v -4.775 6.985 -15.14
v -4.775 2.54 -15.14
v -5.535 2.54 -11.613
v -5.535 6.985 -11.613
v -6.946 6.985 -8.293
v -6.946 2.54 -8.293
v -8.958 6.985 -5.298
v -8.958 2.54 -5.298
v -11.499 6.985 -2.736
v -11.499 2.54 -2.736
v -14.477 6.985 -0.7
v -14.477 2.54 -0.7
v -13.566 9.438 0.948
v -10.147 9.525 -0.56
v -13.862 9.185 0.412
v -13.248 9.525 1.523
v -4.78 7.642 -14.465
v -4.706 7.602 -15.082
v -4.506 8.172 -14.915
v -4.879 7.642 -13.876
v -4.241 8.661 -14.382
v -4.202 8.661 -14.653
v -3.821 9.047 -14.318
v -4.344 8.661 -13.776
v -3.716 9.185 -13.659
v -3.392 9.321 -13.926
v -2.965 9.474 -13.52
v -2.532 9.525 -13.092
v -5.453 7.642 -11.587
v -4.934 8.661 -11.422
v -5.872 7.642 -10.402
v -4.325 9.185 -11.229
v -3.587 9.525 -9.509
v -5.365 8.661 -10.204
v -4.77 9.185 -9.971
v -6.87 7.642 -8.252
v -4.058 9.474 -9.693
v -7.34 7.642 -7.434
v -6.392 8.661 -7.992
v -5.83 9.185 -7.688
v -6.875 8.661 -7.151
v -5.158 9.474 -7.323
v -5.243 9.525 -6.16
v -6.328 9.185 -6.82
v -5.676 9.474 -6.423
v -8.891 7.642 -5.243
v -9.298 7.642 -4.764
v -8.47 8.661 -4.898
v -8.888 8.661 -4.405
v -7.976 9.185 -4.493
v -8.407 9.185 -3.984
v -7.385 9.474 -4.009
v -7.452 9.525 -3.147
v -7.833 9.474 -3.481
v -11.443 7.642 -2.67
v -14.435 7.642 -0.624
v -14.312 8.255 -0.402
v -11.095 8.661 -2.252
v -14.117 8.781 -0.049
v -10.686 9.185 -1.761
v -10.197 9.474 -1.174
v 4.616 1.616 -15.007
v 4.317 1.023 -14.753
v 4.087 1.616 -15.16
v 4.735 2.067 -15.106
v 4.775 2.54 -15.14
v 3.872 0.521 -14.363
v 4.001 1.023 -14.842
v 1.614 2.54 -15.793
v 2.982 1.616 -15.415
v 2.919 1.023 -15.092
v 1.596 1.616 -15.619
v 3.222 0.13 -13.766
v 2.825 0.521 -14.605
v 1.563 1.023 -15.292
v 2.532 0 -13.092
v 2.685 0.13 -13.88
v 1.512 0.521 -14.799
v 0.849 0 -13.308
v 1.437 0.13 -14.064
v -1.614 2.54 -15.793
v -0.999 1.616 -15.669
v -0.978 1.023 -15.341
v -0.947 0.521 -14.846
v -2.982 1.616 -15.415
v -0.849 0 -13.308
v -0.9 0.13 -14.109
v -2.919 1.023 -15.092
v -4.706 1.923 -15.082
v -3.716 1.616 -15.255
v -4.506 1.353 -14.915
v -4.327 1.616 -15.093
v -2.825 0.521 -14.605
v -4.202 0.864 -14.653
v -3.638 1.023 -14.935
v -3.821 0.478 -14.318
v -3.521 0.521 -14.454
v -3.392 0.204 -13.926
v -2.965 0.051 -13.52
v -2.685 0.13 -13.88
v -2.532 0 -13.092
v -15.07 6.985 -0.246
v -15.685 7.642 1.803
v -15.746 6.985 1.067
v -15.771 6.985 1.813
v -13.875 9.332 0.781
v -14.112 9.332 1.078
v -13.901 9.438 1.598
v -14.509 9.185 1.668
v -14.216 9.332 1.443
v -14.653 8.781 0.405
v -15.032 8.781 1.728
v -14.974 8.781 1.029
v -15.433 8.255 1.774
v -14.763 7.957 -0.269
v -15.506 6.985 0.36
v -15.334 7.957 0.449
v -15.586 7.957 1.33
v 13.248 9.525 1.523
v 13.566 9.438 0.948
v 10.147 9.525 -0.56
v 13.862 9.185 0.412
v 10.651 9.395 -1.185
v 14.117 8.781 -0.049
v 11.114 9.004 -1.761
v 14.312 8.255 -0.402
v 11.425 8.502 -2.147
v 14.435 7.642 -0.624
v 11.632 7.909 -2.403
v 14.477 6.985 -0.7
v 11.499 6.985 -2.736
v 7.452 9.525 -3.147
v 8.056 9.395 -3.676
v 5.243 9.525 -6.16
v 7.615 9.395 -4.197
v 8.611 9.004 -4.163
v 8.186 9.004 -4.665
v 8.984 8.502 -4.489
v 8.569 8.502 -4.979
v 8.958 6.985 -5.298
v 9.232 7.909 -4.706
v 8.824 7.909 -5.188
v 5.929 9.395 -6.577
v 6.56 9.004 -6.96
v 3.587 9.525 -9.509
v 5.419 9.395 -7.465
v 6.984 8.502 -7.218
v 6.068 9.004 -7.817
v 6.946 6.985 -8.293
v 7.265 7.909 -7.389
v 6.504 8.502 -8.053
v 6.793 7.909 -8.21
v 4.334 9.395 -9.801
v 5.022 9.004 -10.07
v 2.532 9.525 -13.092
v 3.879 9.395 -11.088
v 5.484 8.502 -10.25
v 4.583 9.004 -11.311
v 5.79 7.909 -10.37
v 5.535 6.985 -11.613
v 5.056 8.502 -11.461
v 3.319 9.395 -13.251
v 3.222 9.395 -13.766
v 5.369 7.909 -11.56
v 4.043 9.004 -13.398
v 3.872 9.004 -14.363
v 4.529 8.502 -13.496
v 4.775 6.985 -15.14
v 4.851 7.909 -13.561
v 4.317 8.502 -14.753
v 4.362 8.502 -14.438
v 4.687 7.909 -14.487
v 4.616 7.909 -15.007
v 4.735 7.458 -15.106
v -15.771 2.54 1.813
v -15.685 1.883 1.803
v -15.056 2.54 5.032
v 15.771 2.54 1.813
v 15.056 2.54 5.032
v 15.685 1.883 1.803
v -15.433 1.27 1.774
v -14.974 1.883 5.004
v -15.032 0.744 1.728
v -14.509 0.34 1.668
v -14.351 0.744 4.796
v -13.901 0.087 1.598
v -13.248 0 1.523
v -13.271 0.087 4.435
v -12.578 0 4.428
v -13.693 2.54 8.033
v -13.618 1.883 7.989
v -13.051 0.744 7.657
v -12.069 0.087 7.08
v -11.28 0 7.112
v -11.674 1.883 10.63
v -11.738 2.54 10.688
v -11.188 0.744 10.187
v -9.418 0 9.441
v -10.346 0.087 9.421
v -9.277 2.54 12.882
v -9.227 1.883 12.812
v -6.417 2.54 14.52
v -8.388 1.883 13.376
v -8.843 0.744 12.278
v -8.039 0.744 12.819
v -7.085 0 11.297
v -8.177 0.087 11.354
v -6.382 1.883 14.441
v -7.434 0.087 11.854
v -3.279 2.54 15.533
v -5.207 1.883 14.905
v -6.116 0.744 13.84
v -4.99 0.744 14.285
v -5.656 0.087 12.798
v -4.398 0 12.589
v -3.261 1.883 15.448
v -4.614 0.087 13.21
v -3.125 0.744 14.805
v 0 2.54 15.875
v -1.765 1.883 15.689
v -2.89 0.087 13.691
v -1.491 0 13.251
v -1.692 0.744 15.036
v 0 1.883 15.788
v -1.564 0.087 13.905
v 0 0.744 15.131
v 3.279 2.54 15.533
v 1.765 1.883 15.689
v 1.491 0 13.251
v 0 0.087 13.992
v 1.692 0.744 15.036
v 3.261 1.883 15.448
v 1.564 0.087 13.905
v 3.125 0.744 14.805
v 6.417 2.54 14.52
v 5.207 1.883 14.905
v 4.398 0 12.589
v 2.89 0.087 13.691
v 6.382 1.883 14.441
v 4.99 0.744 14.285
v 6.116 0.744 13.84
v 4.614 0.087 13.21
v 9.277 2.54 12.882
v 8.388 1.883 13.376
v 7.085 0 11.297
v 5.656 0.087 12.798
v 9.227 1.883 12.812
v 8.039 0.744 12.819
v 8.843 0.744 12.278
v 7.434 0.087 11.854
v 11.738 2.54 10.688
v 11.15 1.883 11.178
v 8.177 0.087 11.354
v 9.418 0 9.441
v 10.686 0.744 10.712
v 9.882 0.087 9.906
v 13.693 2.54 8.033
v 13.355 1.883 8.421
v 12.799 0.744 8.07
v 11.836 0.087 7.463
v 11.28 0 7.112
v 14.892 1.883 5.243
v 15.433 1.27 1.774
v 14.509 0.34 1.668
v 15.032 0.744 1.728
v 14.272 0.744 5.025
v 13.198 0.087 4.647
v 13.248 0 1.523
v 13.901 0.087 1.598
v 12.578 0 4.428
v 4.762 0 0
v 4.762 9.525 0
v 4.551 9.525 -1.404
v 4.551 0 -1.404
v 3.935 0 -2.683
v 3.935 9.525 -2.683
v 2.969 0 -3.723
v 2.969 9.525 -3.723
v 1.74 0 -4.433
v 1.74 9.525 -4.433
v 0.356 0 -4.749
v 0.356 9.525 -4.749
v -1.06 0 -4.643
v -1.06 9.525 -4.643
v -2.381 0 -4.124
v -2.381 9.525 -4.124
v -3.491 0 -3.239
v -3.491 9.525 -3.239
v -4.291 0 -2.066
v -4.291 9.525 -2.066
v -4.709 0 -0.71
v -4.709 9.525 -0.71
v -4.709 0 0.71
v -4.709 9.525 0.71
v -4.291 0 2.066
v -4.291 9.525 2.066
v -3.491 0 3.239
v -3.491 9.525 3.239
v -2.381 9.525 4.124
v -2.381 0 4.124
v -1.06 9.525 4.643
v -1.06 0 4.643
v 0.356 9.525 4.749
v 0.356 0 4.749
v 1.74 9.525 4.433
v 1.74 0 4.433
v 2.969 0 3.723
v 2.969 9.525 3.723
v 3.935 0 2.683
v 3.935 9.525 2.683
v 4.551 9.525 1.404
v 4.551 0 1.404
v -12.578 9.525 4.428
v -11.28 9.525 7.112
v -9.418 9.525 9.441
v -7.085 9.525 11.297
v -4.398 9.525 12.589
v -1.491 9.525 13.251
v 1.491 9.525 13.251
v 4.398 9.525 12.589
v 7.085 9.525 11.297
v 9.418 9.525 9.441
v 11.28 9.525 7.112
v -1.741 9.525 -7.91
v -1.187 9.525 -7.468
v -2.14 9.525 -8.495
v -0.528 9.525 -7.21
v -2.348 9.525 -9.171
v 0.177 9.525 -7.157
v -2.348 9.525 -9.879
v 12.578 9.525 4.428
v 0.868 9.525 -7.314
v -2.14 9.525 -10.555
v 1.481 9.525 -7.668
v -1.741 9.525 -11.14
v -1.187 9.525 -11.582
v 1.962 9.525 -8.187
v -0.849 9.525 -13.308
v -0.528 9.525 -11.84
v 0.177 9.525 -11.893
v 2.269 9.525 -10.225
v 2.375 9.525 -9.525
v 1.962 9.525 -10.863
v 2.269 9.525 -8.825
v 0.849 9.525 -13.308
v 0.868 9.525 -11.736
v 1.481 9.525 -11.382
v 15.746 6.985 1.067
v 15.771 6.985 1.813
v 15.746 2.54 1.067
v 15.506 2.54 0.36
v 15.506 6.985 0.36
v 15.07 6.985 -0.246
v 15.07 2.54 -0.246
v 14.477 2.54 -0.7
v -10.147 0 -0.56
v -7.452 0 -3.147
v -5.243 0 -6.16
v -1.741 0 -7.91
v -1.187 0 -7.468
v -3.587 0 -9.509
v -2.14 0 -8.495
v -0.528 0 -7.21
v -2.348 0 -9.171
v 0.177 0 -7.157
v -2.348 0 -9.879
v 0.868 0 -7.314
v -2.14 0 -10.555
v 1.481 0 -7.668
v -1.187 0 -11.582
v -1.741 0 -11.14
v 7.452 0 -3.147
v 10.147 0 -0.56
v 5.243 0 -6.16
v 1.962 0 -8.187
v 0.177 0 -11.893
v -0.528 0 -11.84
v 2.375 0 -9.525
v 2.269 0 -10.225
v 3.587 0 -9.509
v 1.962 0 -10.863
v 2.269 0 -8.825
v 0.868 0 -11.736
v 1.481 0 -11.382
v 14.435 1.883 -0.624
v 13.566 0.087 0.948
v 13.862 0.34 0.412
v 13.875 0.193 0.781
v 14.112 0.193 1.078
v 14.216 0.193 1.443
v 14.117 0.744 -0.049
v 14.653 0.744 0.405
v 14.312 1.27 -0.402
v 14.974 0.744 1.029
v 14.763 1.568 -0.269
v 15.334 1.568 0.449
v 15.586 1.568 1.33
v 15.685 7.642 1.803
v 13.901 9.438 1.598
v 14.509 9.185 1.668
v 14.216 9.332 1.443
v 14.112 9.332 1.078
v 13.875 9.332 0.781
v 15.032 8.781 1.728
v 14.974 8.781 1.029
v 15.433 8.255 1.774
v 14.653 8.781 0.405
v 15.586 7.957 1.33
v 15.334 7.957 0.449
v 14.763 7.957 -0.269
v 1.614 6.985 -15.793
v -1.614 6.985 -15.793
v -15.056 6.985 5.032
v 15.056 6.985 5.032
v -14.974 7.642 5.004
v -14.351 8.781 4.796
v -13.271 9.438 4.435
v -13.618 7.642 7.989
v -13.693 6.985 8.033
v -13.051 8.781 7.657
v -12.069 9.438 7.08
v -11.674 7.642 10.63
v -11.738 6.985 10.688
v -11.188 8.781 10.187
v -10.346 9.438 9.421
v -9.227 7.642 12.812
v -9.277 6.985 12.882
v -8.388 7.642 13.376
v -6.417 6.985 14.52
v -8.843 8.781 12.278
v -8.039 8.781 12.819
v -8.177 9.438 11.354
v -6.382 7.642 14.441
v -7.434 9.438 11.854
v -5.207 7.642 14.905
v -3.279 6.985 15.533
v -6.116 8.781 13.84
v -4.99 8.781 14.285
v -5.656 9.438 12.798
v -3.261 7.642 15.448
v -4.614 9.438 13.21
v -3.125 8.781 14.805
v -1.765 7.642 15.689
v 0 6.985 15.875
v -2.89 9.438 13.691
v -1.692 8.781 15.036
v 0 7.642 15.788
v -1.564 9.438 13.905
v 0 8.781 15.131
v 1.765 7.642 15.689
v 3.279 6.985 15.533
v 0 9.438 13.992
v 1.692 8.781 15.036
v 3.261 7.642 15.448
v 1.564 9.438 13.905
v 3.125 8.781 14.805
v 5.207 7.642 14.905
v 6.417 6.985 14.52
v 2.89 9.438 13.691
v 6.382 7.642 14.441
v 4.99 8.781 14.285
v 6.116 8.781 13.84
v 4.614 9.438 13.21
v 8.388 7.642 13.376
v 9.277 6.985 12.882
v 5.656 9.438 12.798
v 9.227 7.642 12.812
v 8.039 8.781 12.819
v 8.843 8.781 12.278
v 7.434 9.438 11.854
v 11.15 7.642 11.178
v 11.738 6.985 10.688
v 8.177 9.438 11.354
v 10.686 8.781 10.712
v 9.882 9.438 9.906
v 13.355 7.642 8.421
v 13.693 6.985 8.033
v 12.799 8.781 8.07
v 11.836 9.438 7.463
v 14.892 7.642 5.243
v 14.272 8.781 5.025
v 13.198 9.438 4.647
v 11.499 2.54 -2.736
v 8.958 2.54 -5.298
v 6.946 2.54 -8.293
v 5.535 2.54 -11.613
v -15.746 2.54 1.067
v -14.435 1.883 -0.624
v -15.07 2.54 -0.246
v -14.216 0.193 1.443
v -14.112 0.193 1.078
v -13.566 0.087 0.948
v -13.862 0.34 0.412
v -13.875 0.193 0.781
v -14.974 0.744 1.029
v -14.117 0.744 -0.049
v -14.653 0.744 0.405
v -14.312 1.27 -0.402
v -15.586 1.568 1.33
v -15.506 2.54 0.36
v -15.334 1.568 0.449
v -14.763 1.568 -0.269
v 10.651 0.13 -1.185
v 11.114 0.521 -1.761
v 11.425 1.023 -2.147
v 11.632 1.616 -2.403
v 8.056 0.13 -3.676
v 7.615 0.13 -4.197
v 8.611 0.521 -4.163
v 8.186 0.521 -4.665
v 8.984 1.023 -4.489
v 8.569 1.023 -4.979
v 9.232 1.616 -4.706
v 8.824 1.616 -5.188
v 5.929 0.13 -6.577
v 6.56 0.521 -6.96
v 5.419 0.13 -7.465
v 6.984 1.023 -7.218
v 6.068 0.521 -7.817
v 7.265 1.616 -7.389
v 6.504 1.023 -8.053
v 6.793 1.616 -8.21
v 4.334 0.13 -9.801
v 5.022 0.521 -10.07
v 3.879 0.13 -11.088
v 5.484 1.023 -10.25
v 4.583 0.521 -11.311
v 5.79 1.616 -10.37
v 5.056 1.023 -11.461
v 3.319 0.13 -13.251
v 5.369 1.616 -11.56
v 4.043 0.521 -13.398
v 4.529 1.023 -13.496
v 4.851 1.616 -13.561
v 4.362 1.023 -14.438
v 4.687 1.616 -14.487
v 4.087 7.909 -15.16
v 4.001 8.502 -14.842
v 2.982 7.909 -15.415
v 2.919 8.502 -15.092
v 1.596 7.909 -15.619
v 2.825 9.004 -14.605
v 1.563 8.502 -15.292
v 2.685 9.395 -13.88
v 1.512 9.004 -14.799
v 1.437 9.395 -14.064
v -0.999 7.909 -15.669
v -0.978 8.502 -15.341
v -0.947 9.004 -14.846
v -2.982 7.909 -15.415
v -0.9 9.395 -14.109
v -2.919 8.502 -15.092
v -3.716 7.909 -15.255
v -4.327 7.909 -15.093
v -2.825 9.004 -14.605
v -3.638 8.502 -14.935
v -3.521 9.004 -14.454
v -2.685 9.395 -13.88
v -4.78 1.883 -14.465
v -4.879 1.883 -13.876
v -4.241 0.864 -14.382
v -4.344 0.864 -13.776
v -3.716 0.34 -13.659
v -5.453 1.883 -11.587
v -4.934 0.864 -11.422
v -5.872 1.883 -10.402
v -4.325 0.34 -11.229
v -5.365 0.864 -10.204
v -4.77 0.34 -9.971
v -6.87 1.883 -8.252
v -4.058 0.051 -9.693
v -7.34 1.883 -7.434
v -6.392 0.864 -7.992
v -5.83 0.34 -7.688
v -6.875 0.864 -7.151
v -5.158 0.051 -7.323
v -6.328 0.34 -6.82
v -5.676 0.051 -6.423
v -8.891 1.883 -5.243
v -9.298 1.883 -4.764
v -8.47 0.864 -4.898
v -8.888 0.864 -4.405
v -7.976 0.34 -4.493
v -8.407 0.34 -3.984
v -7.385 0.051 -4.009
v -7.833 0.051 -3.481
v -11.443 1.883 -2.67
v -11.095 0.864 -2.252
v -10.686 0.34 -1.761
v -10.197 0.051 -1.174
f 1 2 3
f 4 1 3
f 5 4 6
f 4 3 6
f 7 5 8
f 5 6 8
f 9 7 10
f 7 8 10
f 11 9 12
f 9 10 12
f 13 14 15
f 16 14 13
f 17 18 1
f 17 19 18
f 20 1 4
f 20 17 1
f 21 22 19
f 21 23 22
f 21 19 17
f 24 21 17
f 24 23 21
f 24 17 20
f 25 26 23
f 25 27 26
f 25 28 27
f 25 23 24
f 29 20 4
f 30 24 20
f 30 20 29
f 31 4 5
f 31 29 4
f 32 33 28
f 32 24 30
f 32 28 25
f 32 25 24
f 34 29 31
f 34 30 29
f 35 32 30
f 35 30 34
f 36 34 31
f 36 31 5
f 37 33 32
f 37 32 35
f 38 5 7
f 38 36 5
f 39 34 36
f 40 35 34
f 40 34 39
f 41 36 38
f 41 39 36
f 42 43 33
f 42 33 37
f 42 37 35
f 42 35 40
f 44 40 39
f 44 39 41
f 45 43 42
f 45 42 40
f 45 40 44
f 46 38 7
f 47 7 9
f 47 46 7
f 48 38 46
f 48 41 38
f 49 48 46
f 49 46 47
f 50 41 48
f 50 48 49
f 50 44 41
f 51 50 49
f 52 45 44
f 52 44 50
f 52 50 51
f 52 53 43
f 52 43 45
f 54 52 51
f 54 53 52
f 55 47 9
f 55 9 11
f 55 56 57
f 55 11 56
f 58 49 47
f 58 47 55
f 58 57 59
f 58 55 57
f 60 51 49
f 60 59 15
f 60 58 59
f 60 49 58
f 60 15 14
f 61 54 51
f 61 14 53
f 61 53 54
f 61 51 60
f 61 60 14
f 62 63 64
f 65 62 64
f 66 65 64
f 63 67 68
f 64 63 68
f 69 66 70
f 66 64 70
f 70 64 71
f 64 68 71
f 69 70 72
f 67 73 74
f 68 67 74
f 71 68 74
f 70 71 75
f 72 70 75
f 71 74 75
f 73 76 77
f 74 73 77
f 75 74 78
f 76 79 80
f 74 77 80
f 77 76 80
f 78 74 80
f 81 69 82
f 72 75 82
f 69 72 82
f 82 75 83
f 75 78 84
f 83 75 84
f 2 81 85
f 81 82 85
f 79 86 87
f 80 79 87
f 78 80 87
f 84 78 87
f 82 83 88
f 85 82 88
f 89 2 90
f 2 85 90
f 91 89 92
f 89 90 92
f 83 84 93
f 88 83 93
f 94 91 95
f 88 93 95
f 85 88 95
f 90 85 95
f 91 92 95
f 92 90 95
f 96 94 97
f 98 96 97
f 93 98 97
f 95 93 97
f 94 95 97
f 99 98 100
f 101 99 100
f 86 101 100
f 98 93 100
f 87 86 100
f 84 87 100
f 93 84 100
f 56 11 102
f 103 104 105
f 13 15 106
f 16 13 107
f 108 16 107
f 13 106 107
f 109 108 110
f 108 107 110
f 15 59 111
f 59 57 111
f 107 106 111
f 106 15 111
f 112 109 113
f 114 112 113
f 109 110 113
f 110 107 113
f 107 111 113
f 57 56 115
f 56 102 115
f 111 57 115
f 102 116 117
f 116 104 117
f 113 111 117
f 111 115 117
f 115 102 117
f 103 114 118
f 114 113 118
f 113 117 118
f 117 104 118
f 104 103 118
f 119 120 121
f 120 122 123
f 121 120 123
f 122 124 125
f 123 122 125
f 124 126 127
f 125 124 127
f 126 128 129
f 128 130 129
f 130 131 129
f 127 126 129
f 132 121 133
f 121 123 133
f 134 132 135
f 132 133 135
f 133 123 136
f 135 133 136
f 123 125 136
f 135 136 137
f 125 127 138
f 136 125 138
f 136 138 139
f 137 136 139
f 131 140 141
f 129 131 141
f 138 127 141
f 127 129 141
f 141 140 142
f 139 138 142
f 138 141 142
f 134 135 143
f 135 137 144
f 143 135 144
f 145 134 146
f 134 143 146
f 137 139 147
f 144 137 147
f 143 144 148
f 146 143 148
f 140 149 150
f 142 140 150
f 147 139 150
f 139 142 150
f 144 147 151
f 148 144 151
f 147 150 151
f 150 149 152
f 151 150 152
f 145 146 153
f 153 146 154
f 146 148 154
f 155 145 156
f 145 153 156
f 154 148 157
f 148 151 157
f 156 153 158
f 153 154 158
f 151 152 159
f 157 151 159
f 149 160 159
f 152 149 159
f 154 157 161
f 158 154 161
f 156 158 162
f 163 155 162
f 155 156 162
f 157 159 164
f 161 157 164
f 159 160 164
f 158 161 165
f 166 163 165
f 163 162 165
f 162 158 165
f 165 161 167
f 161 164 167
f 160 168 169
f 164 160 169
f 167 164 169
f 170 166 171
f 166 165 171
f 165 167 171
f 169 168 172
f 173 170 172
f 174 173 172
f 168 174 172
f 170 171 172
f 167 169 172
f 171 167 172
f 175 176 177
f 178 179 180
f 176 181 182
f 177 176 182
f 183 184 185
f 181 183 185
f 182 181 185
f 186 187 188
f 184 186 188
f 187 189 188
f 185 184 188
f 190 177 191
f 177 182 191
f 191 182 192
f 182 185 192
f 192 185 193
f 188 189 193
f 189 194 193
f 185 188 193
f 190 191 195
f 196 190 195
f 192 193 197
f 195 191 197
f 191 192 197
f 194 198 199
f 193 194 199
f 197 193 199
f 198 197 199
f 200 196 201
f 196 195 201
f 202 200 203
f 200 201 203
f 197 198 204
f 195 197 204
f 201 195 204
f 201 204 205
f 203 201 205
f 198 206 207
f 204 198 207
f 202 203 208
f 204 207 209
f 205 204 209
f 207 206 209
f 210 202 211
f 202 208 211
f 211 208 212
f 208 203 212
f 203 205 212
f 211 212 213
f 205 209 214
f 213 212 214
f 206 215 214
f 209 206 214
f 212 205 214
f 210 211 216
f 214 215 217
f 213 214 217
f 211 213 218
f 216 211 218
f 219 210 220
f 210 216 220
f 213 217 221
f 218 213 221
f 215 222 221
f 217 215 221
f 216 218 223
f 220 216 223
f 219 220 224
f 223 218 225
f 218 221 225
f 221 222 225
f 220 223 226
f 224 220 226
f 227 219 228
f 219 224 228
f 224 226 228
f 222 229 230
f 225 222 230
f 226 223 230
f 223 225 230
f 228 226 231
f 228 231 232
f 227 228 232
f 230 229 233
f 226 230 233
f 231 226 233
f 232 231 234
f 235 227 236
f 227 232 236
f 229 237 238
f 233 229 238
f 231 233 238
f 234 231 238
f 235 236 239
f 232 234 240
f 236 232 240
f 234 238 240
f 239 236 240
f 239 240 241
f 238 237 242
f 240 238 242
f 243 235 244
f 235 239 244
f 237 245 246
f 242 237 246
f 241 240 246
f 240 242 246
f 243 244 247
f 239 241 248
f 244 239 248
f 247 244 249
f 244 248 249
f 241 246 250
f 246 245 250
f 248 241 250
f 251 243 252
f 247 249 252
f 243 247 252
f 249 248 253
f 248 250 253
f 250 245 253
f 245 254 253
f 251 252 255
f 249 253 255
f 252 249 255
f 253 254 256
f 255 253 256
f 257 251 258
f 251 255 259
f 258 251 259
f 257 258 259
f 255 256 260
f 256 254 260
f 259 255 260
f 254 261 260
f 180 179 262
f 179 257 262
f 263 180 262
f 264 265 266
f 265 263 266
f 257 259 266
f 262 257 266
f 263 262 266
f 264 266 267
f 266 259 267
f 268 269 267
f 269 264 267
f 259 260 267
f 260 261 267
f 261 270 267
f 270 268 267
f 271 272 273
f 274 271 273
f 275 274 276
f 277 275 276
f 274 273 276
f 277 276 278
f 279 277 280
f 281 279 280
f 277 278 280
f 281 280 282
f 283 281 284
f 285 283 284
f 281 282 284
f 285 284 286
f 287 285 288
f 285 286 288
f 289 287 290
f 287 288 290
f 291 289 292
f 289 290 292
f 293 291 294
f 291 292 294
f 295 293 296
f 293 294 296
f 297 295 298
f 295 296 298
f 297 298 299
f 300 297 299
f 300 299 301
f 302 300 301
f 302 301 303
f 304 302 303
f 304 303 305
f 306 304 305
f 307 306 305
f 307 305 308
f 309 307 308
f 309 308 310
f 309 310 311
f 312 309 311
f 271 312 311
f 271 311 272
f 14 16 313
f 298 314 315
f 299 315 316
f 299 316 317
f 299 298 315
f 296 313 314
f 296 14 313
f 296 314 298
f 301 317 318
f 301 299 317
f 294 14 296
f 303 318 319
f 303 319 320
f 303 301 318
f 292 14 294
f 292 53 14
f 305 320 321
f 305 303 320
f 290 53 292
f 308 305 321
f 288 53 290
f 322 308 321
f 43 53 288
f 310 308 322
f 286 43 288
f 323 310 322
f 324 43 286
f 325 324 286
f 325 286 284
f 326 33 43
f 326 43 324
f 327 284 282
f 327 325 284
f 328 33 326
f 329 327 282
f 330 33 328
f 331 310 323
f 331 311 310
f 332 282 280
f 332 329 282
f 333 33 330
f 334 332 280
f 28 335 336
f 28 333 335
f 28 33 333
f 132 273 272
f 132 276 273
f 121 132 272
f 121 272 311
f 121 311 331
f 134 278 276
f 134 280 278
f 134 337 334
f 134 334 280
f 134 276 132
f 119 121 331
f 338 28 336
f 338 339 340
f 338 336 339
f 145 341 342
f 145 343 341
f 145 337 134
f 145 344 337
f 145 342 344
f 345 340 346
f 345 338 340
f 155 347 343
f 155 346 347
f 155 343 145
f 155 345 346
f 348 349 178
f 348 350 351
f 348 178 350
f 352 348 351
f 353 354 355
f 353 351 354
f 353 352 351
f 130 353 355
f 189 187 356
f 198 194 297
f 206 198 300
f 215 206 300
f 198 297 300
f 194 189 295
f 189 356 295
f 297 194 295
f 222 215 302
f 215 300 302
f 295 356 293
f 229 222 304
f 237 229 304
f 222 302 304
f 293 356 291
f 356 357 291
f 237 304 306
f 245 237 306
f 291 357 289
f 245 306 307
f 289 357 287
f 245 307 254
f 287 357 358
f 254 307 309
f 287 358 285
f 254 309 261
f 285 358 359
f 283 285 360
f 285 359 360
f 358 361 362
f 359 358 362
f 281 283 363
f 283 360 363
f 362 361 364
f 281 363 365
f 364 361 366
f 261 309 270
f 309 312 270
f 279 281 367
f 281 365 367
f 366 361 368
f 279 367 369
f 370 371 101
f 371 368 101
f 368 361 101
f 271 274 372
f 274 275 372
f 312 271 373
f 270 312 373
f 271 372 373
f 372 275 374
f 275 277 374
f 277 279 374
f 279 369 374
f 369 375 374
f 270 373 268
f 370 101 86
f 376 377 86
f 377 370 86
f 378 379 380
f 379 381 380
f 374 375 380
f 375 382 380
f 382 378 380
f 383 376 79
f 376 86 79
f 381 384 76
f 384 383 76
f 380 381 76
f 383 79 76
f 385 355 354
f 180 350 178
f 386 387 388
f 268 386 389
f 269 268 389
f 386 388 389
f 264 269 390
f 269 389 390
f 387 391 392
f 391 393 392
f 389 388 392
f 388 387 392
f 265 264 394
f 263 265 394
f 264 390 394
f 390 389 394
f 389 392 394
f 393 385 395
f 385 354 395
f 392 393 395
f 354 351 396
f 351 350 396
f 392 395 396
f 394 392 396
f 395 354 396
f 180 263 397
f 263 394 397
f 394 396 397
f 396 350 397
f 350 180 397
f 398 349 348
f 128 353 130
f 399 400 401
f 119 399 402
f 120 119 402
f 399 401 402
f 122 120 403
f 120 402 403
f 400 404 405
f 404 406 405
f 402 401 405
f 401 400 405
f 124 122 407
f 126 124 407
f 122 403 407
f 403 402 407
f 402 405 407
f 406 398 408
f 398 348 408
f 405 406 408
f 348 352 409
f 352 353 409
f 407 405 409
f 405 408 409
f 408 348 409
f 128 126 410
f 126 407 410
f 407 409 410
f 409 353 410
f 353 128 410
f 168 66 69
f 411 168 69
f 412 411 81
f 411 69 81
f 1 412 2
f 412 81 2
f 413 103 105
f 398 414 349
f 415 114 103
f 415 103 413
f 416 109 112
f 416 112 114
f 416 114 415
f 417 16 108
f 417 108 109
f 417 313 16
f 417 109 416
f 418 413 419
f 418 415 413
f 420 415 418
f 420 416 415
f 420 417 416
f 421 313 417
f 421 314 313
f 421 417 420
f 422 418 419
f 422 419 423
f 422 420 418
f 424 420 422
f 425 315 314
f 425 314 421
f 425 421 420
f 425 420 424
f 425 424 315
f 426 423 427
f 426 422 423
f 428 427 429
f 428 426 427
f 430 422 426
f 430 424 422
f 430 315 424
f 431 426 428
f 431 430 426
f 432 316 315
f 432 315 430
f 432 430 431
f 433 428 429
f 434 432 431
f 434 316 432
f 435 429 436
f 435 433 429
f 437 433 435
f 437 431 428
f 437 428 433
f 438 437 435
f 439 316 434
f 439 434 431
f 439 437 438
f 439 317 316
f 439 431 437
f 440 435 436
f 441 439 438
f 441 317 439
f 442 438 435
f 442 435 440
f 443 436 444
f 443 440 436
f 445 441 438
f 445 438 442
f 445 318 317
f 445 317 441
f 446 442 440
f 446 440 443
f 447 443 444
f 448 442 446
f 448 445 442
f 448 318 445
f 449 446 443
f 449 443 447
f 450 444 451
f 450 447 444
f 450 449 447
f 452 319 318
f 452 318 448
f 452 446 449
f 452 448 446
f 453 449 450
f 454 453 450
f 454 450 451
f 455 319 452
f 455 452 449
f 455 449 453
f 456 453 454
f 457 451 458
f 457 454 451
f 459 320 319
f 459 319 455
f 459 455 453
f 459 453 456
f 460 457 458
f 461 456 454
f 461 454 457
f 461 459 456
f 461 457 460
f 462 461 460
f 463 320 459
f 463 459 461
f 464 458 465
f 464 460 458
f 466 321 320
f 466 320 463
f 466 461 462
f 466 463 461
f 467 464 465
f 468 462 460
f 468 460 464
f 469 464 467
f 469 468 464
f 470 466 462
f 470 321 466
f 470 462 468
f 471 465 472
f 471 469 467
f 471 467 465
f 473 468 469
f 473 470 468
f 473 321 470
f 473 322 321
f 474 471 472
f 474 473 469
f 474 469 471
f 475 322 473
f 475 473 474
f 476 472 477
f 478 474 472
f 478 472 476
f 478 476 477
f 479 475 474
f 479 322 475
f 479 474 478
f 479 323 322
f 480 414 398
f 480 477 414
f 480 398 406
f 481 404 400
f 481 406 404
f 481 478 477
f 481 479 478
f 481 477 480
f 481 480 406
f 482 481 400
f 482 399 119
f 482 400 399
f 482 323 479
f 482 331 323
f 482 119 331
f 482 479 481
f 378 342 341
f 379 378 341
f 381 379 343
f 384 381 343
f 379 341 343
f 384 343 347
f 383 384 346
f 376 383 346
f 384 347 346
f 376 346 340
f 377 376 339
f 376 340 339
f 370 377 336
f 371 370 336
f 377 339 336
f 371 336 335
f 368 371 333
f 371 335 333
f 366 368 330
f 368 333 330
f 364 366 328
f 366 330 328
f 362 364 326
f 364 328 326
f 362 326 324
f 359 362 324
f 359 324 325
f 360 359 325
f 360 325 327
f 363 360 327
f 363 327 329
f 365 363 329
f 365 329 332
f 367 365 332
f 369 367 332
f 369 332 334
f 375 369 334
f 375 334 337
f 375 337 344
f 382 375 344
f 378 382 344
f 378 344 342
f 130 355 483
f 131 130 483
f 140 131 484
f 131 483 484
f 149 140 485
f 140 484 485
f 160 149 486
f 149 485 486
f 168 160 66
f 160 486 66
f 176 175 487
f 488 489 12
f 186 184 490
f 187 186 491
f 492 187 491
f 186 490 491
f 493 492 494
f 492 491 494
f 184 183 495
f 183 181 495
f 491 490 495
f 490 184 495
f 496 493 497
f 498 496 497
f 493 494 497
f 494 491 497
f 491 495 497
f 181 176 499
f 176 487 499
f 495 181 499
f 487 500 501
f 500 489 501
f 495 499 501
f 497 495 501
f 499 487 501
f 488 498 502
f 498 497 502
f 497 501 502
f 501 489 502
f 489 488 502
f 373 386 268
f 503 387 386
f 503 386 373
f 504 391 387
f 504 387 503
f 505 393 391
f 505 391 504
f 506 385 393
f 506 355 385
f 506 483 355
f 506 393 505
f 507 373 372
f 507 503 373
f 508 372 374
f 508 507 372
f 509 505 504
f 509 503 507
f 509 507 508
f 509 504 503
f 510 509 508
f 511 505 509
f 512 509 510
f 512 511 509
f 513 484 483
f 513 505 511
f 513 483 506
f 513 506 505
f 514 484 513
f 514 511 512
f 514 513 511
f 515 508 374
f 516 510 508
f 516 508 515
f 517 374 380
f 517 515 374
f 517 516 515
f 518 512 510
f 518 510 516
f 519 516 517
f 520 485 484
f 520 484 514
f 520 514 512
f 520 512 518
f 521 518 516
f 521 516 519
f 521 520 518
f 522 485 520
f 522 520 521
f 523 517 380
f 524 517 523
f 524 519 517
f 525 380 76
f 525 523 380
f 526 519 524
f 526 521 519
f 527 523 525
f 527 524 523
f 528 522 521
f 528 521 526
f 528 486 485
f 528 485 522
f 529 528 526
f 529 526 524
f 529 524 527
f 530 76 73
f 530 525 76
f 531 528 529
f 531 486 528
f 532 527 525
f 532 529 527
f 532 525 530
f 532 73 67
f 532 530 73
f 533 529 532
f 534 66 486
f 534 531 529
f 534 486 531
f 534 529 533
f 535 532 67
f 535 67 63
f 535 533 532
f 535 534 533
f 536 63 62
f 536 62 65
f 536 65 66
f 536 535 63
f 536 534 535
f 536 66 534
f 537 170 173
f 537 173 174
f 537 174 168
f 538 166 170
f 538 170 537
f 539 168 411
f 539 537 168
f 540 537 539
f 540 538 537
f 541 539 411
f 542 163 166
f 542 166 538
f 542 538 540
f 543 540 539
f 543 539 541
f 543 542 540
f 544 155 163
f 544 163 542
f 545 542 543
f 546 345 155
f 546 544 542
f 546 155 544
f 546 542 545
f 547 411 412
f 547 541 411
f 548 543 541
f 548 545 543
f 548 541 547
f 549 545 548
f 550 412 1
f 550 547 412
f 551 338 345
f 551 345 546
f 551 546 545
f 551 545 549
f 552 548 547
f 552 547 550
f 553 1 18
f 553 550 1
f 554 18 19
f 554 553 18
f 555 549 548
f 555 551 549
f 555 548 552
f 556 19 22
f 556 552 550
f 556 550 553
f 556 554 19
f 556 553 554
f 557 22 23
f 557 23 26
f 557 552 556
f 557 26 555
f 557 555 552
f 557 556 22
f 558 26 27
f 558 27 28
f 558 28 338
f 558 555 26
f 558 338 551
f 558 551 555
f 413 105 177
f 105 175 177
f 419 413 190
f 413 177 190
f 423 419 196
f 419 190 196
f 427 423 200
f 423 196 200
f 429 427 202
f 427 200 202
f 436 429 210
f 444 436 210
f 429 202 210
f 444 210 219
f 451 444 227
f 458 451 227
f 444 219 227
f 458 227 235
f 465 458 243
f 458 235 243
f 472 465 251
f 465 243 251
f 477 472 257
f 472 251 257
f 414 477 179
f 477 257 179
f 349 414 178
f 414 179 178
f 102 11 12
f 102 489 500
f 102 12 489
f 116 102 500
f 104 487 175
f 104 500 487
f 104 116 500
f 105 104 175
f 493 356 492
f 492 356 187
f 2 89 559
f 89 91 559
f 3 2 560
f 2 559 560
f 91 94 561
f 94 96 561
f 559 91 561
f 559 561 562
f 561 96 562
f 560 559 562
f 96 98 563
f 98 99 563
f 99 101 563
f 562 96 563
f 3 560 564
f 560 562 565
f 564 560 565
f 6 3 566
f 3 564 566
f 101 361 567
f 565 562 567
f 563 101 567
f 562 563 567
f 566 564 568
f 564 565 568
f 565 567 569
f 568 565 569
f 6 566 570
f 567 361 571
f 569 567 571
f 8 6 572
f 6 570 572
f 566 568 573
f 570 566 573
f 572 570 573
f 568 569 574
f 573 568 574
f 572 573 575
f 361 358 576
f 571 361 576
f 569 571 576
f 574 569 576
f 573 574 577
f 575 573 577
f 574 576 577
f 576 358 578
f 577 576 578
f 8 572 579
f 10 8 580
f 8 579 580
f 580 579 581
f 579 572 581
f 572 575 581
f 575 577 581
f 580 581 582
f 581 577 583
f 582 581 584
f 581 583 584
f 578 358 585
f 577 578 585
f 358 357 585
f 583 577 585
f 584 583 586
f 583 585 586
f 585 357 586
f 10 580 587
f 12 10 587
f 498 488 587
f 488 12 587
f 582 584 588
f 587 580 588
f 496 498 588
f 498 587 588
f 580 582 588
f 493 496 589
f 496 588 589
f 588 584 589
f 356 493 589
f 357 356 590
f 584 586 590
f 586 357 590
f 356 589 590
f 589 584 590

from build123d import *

# Parameters (mm, degrees)
BOSS_EXTRUDE1_DEPTH = 9.525
SKETCH2_R           = 4.7625
SKETCH2_R_2         = 2.3749
CUT_EXTRUDE1_DEPTH  = 10.525
FILLET4_R           = 2.54


with BuildPart() as part:
    # Sketch1 → Boss-Extrude1 (new body)
    with BuildSketch(Plane(origin=(0, 0, 0), x_dir=(1, 0, 0), z_dir=(0, 1, 0))):
        with BuildLine():
            ThreePointArc((-4.7752, 15.139785004), (-8.330712377, 6.107698439), (-15.875, 0))
            ThreePointArc((-15.875, 0), (0, -15.875), (15.875, 0))
            ThreePointArc((15.875, 0), (8.330712377, 6.107698439), (4.7752, 15.139785004))
            ThreePointArc((4.7752, 15.139785004), (0, 15.875), (-4.7752, 15.139785004))
        make_face()
    extrude(amount=BOSS_EXTRUDE1_DEPTH)

    # Sketch2 → Cut-Extrude1 (cut, through all)
    with BuildSketch(Plane(origin=(0, 9.525, 0), x_dir=(1, 0, 0), z_dir=(0, 1, 0))):
        Circle(SKETCH2_R)
        with Locations((0, 9.525)):
            Circle(SKETCH2_R_2)
    extrude(amount=-CUT_EXTRUDE1_DEPTH, mode=Mode.SUBTRACT)

    # Fillet4
    fillet4_edges = [part.edges().sort_by_distance(p)[0] for p in [
        (0, 9.525, 15.875),
        (8.330712377, 9.525, -6.107698439),
        (0, 9.525, -15.875),
        (8.330712377, 0, -6.107698439),
        (0, 0, 15.875),
        (-8.330712377, 0, -6.107698439),
        (0, 0, -15.875),
        (15.875, 4.7625, 0),
        (-15.875, 4.7625, 0),
        (-8.330712377, 9.525, -6.107698439),
    ]]
    fillet(fillet4_edges, radius=FILLET4_R)


solid = part.part
